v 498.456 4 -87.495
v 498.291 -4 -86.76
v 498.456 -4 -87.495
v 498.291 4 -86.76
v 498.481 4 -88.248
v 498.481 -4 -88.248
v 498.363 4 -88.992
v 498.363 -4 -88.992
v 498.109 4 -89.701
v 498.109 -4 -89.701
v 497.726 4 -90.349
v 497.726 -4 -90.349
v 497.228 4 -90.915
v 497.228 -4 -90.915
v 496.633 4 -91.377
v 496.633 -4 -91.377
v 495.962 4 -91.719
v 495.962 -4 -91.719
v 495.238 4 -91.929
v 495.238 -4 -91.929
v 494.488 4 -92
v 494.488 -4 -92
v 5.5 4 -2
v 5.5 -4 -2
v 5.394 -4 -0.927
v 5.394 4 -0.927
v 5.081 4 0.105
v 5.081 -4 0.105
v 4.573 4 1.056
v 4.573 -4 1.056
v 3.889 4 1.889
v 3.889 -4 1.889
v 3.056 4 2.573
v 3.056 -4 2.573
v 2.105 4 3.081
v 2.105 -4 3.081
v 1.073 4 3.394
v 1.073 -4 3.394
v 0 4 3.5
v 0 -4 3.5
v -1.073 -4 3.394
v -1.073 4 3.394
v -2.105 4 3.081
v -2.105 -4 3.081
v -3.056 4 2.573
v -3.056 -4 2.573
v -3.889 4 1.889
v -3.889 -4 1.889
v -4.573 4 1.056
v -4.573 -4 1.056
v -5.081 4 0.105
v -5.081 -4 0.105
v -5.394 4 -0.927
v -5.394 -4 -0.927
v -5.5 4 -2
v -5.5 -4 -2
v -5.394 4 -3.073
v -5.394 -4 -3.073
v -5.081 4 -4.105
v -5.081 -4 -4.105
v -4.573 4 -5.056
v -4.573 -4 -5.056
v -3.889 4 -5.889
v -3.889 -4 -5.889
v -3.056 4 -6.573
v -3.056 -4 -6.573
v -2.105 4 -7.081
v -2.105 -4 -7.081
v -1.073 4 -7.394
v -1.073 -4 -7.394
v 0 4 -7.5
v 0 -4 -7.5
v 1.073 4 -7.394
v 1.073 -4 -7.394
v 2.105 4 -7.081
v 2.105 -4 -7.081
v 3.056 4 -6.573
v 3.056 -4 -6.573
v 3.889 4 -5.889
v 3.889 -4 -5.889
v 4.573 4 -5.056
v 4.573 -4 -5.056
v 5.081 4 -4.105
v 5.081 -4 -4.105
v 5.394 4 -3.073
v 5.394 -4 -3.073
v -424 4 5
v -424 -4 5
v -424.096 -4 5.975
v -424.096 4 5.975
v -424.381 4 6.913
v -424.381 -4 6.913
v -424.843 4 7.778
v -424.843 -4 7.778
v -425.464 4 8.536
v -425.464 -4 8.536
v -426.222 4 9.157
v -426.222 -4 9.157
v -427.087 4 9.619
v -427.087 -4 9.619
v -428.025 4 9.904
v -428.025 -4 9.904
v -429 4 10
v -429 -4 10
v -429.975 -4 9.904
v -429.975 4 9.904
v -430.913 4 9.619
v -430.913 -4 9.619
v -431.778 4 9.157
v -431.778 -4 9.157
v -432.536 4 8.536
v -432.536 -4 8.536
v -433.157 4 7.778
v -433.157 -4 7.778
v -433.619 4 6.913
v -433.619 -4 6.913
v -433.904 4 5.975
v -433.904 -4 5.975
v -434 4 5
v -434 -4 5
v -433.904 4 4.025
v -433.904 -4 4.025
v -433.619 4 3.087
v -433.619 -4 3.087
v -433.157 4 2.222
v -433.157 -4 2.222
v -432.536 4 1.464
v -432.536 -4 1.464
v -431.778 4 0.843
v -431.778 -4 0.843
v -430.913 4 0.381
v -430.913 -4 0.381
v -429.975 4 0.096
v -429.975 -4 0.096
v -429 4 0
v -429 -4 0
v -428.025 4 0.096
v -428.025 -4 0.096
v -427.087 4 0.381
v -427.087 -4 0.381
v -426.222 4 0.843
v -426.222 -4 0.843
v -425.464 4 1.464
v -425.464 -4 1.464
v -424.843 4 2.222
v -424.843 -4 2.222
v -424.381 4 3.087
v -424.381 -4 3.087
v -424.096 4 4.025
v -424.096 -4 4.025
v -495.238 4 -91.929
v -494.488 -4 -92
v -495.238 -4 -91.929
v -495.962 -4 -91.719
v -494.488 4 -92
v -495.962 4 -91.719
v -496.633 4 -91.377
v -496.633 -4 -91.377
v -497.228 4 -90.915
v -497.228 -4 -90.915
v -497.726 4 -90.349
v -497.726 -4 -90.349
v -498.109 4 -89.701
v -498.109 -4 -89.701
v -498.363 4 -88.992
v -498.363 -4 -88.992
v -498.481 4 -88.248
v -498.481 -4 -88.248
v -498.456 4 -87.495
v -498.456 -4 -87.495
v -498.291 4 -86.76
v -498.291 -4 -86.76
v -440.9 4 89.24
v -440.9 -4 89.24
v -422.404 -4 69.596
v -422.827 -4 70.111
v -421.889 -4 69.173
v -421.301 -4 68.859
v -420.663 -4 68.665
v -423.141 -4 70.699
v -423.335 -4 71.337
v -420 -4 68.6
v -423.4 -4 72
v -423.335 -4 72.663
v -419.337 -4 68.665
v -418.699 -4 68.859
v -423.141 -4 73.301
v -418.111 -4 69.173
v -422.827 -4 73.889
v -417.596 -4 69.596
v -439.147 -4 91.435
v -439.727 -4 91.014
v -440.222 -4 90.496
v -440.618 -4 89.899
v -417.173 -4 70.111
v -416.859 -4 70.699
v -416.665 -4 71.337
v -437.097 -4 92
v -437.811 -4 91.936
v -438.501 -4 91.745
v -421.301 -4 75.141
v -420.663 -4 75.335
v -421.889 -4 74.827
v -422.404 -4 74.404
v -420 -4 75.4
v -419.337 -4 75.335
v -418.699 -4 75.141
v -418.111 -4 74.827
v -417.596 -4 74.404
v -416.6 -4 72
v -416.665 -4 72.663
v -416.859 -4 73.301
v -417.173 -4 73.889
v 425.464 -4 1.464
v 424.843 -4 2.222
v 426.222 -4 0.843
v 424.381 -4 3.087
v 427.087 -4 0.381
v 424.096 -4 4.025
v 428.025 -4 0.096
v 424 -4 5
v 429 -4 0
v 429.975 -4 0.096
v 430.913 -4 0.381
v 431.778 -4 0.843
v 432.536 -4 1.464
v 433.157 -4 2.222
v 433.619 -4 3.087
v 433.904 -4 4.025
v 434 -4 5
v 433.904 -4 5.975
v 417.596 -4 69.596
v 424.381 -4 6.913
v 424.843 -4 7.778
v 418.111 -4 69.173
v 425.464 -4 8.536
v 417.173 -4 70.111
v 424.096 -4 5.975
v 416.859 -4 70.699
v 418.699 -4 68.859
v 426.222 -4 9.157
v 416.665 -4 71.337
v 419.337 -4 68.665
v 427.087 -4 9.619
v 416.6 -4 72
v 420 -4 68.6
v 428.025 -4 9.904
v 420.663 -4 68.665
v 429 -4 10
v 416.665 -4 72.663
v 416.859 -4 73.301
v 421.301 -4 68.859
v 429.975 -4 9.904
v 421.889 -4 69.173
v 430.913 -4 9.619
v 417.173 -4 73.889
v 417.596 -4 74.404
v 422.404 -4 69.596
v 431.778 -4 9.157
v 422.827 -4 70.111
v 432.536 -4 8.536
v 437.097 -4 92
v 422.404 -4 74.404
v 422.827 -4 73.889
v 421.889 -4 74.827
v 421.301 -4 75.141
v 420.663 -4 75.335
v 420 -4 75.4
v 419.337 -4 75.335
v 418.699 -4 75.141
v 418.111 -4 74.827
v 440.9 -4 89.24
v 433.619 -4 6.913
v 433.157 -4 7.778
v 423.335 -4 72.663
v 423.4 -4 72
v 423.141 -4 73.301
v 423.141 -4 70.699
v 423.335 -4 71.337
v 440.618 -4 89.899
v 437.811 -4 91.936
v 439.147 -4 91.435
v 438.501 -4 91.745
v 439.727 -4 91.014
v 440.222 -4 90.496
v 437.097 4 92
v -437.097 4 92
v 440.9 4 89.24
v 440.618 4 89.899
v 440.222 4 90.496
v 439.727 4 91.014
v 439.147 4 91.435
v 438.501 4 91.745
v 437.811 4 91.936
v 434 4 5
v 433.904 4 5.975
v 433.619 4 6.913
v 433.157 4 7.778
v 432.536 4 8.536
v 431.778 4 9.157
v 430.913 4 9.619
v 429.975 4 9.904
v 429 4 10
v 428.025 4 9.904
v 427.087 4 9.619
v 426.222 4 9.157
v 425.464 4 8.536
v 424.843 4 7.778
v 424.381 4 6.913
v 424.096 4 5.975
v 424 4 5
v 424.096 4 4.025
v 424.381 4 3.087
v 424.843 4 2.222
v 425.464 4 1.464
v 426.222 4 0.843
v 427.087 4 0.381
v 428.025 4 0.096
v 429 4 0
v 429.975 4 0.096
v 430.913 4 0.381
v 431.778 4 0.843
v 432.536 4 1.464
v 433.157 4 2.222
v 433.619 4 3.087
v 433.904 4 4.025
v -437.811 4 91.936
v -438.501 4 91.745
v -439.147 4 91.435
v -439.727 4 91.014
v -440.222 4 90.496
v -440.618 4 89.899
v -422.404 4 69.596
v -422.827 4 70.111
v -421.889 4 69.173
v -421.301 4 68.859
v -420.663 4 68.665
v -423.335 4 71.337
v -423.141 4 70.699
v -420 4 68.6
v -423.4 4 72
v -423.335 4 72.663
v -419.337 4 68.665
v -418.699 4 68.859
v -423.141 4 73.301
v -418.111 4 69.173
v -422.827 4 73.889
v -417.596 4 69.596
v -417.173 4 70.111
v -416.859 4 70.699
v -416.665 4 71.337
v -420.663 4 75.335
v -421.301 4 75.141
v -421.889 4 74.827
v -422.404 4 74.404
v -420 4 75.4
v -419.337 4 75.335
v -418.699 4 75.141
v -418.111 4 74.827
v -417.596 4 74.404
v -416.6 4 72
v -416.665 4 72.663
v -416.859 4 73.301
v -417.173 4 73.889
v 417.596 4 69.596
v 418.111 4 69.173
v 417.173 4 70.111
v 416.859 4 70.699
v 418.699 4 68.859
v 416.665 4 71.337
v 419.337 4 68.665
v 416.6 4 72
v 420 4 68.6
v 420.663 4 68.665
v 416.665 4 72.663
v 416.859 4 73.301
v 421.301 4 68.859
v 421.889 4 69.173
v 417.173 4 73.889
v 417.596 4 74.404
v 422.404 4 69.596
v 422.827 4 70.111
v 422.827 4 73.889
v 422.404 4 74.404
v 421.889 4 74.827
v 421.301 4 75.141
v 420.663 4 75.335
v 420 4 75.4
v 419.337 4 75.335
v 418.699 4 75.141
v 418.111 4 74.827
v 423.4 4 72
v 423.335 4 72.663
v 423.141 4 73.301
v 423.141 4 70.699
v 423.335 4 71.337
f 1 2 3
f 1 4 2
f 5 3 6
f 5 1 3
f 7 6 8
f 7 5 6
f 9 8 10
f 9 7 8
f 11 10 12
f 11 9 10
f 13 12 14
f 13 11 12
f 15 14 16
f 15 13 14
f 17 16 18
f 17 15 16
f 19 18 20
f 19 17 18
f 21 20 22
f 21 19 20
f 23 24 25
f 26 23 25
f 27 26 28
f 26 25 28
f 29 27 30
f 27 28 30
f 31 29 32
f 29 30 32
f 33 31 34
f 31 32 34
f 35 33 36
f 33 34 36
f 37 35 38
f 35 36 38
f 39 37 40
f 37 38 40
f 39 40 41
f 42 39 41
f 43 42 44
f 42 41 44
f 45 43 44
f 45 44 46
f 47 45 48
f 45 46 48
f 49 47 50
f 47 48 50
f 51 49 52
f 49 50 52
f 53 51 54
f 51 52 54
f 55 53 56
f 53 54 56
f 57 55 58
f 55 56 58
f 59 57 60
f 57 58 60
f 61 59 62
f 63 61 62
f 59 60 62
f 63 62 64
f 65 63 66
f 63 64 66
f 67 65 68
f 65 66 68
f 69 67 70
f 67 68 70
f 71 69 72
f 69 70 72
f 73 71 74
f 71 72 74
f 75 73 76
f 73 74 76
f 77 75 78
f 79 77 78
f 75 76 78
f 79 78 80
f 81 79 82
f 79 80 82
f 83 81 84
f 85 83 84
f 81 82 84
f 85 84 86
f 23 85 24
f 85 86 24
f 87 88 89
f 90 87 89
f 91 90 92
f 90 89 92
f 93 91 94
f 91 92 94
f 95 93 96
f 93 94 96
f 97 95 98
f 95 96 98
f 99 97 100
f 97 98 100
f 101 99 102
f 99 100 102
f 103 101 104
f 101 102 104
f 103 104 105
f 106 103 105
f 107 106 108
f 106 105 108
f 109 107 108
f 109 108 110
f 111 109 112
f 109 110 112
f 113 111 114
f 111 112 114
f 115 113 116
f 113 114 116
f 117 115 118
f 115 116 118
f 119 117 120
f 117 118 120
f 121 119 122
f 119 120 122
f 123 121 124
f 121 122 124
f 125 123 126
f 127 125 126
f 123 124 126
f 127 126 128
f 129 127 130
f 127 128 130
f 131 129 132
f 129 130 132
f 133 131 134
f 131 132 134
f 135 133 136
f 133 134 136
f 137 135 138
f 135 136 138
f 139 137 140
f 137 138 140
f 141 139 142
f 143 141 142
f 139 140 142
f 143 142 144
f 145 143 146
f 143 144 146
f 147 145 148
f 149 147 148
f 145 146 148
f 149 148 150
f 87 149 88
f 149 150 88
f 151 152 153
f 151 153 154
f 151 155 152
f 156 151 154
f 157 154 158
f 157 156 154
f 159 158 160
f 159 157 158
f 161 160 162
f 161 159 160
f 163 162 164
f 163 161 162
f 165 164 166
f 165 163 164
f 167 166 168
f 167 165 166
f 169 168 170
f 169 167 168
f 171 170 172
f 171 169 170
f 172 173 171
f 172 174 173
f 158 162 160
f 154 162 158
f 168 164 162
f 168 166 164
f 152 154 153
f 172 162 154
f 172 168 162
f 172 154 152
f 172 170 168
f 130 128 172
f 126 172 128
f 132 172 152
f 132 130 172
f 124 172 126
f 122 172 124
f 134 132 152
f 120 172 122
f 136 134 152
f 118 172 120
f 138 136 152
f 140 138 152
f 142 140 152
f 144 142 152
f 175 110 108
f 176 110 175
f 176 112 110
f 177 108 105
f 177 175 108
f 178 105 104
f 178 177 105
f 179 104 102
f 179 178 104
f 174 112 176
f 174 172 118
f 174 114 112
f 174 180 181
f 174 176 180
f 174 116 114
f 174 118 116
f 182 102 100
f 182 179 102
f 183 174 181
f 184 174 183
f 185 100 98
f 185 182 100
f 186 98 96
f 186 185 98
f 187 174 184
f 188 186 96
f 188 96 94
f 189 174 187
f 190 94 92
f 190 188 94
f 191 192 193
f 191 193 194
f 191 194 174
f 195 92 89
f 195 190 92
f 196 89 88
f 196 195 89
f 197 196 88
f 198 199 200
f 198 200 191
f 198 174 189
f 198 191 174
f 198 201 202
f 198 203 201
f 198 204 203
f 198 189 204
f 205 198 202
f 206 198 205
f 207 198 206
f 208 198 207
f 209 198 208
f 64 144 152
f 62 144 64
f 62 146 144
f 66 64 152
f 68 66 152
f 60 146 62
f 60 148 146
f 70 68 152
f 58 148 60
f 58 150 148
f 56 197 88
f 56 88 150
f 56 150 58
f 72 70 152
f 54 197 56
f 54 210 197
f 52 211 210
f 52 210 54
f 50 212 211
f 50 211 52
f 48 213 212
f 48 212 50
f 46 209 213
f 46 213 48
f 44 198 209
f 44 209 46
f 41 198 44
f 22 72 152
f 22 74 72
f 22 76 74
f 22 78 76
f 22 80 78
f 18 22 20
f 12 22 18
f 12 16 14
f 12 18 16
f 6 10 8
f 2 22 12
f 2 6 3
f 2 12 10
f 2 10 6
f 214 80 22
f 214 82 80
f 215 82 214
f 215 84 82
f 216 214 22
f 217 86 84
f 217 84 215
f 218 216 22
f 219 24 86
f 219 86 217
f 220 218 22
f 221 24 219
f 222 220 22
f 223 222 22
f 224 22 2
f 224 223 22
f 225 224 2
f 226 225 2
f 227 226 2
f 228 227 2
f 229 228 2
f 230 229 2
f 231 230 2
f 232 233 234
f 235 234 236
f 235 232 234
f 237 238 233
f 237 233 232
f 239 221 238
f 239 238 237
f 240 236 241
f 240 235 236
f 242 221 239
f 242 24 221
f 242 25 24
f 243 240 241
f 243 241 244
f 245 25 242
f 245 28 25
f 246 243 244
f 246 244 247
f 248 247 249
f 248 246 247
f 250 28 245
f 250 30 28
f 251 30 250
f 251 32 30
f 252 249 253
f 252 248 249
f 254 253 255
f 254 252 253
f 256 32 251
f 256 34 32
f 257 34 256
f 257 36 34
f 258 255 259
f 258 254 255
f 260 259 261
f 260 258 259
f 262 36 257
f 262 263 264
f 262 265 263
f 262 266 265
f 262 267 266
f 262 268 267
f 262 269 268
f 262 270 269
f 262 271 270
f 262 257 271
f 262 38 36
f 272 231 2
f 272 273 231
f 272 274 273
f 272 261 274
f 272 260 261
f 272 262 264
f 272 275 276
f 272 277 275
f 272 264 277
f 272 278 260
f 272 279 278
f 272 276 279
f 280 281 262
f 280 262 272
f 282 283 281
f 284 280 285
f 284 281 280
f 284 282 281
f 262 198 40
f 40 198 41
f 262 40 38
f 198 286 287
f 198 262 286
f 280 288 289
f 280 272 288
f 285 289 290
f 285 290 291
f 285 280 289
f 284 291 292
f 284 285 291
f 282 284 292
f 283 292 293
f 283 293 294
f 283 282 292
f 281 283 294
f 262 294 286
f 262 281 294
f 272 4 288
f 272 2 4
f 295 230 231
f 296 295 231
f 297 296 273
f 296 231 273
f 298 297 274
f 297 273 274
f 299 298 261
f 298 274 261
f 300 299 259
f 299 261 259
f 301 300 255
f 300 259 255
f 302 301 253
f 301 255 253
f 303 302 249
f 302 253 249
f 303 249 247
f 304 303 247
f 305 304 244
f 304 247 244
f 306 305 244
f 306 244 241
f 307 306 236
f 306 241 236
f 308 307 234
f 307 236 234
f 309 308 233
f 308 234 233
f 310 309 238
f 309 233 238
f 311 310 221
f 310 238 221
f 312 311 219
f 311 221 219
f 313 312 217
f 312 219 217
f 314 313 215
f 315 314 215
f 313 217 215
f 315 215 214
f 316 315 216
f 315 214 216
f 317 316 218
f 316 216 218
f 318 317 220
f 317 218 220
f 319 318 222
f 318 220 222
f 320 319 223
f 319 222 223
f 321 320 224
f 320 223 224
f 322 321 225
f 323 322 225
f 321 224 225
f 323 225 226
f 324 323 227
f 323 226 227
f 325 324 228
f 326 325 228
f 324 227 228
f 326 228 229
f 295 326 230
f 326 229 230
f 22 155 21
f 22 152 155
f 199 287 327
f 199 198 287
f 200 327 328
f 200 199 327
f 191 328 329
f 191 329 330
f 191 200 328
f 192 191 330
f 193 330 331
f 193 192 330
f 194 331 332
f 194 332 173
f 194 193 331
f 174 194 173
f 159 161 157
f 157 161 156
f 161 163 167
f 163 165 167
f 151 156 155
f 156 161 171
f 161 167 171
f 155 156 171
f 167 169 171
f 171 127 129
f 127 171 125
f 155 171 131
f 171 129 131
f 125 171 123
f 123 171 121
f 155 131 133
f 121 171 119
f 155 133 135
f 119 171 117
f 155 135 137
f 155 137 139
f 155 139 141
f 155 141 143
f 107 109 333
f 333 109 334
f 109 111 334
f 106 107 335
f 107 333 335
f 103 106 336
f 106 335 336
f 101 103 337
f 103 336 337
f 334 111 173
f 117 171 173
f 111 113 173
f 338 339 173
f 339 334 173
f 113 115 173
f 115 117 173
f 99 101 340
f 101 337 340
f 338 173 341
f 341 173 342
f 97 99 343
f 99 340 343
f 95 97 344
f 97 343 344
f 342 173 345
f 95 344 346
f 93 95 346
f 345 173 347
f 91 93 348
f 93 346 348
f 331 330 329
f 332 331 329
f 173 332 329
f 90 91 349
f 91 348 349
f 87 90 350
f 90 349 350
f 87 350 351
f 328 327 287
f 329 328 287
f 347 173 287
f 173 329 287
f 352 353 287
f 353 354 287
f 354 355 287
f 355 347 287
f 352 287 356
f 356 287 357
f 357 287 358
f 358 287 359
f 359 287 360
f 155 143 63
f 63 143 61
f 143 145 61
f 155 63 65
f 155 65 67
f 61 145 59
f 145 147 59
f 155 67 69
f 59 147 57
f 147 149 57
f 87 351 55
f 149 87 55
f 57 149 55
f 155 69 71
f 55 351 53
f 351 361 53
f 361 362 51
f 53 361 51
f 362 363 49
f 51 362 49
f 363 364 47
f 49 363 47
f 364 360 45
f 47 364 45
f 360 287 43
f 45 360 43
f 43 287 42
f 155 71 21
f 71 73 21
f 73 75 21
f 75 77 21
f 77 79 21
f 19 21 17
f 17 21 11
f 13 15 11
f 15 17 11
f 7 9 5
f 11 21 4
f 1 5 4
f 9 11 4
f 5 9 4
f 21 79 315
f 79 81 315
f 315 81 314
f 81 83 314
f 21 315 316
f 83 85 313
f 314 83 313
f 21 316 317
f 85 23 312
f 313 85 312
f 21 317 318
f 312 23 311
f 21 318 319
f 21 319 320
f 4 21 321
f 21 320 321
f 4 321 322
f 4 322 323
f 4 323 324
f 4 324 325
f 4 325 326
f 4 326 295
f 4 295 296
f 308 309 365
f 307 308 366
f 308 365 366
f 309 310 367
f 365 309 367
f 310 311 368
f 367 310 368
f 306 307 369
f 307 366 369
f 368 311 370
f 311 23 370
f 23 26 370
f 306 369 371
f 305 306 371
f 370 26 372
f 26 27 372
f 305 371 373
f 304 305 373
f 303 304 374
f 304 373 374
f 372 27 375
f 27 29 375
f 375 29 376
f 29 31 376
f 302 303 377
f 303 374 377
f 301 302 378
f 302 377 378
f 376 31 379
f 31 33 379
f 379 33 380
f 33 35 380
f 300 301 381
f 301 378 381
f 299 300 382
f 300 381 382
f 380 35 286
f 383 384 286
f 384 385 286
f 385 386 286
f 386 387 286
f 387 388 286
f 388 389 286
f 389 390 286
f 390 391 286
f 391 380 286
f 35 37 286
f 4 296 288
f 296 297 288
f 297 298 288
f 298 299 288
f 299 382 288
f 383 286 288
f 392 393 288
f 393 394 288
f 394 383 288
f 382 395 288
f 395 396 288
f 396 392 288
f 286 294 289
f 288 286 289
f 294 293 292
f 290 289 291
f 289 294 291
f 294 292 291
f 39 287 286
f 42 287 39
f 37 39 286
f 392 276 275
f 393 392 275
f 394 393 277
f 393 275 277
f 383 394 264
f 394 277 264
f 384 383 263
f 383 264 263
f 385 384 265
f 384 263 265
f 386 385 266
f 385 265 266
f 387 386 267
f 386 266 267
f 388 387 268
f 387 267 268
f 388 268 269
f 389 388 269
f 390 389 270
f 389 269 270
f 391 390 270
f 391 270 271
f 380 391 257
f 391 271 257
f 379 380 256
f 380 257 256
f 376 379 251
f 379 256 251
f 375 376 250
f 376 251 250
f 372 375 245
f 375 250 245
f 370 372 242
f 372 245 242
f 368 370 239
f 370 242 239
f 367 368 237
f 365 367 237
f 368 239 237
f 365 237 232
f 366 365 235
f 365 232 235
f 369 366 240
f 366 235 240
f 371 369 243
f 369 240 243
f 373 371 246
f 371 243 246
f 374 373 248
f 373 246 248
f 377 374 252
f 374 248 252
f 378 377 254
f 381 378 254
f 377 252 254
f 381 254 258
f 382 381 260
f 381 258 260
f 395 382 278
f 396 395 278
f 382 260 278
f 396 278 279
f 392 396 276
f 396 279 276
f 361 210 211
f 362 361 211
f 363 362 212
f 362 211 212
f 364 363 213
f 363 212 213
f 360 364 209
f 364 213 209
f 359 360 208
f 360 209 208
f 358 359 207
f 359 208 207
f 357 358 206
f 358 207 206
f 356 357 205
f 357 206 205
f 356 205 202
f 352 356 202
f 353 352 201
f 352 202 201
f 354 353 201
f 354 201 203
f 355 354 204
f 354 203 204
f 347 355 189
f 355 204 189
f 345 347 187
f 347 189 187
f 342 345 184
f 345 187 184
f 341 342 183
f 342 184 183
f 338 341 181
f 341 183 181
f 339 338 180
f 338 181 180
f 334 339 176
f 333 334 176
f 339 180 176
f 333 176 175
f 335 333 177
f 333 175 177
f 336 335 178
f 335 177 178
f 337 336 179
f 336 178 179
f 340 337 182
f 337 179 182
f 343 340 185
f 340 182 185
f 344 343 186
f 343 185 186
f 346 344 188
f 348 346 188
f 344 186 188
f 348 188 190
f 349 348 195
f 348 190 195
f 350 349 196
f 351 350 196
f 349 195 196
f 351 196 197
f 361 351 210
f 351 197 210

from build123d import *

# Parameters (mm, degrees)
F1_DEPTH = 4
F2_R     = 5
F2_R_2   = 3.4
F2_R_3   = 5.5
F3_DEPTH = 8
F4_R     = 4


with BuildPart() as f1:
    # F0 (on Front) → F1 (new body, symmetric)
    with BuildSketch(Plane.XZ):
        Polygon((500, -92), (440, 92), (-440, 92), (-500, -92), (-440, -92), (440, -92), align=None)
    extrude(amount=F1_DEPTH, both=True)

    # F2 (on face) → F3 (cut)
    with BuildSketch(Plane.XZ.offset(4)):
        with Locations((429, 5)):
            Circle(F2_R)
        with Locations((420, 72)):
            Circle(F2_R_2)
        with Locations((-420, 72)):
            Circle(F2_R_2)
        with Locations((-429, 5)):
            Circle(F2_R)
        with Locations((0, -2)):
            Circle(F2_R_3)
    extrude(amount=-F3_DEPTH, mode=Mode.SUBTRACT)

    # F4
    f4_edges = [f1.edges().sort_by_distance(p)[0] for p in [
        (500, 0, -92),
        (-500, 0, -92),
        (440, 0, 92),
        (-440, 0, 92),
    ]]
    fillet(f4_edges, radius=F4_R)


solid = f1.part
